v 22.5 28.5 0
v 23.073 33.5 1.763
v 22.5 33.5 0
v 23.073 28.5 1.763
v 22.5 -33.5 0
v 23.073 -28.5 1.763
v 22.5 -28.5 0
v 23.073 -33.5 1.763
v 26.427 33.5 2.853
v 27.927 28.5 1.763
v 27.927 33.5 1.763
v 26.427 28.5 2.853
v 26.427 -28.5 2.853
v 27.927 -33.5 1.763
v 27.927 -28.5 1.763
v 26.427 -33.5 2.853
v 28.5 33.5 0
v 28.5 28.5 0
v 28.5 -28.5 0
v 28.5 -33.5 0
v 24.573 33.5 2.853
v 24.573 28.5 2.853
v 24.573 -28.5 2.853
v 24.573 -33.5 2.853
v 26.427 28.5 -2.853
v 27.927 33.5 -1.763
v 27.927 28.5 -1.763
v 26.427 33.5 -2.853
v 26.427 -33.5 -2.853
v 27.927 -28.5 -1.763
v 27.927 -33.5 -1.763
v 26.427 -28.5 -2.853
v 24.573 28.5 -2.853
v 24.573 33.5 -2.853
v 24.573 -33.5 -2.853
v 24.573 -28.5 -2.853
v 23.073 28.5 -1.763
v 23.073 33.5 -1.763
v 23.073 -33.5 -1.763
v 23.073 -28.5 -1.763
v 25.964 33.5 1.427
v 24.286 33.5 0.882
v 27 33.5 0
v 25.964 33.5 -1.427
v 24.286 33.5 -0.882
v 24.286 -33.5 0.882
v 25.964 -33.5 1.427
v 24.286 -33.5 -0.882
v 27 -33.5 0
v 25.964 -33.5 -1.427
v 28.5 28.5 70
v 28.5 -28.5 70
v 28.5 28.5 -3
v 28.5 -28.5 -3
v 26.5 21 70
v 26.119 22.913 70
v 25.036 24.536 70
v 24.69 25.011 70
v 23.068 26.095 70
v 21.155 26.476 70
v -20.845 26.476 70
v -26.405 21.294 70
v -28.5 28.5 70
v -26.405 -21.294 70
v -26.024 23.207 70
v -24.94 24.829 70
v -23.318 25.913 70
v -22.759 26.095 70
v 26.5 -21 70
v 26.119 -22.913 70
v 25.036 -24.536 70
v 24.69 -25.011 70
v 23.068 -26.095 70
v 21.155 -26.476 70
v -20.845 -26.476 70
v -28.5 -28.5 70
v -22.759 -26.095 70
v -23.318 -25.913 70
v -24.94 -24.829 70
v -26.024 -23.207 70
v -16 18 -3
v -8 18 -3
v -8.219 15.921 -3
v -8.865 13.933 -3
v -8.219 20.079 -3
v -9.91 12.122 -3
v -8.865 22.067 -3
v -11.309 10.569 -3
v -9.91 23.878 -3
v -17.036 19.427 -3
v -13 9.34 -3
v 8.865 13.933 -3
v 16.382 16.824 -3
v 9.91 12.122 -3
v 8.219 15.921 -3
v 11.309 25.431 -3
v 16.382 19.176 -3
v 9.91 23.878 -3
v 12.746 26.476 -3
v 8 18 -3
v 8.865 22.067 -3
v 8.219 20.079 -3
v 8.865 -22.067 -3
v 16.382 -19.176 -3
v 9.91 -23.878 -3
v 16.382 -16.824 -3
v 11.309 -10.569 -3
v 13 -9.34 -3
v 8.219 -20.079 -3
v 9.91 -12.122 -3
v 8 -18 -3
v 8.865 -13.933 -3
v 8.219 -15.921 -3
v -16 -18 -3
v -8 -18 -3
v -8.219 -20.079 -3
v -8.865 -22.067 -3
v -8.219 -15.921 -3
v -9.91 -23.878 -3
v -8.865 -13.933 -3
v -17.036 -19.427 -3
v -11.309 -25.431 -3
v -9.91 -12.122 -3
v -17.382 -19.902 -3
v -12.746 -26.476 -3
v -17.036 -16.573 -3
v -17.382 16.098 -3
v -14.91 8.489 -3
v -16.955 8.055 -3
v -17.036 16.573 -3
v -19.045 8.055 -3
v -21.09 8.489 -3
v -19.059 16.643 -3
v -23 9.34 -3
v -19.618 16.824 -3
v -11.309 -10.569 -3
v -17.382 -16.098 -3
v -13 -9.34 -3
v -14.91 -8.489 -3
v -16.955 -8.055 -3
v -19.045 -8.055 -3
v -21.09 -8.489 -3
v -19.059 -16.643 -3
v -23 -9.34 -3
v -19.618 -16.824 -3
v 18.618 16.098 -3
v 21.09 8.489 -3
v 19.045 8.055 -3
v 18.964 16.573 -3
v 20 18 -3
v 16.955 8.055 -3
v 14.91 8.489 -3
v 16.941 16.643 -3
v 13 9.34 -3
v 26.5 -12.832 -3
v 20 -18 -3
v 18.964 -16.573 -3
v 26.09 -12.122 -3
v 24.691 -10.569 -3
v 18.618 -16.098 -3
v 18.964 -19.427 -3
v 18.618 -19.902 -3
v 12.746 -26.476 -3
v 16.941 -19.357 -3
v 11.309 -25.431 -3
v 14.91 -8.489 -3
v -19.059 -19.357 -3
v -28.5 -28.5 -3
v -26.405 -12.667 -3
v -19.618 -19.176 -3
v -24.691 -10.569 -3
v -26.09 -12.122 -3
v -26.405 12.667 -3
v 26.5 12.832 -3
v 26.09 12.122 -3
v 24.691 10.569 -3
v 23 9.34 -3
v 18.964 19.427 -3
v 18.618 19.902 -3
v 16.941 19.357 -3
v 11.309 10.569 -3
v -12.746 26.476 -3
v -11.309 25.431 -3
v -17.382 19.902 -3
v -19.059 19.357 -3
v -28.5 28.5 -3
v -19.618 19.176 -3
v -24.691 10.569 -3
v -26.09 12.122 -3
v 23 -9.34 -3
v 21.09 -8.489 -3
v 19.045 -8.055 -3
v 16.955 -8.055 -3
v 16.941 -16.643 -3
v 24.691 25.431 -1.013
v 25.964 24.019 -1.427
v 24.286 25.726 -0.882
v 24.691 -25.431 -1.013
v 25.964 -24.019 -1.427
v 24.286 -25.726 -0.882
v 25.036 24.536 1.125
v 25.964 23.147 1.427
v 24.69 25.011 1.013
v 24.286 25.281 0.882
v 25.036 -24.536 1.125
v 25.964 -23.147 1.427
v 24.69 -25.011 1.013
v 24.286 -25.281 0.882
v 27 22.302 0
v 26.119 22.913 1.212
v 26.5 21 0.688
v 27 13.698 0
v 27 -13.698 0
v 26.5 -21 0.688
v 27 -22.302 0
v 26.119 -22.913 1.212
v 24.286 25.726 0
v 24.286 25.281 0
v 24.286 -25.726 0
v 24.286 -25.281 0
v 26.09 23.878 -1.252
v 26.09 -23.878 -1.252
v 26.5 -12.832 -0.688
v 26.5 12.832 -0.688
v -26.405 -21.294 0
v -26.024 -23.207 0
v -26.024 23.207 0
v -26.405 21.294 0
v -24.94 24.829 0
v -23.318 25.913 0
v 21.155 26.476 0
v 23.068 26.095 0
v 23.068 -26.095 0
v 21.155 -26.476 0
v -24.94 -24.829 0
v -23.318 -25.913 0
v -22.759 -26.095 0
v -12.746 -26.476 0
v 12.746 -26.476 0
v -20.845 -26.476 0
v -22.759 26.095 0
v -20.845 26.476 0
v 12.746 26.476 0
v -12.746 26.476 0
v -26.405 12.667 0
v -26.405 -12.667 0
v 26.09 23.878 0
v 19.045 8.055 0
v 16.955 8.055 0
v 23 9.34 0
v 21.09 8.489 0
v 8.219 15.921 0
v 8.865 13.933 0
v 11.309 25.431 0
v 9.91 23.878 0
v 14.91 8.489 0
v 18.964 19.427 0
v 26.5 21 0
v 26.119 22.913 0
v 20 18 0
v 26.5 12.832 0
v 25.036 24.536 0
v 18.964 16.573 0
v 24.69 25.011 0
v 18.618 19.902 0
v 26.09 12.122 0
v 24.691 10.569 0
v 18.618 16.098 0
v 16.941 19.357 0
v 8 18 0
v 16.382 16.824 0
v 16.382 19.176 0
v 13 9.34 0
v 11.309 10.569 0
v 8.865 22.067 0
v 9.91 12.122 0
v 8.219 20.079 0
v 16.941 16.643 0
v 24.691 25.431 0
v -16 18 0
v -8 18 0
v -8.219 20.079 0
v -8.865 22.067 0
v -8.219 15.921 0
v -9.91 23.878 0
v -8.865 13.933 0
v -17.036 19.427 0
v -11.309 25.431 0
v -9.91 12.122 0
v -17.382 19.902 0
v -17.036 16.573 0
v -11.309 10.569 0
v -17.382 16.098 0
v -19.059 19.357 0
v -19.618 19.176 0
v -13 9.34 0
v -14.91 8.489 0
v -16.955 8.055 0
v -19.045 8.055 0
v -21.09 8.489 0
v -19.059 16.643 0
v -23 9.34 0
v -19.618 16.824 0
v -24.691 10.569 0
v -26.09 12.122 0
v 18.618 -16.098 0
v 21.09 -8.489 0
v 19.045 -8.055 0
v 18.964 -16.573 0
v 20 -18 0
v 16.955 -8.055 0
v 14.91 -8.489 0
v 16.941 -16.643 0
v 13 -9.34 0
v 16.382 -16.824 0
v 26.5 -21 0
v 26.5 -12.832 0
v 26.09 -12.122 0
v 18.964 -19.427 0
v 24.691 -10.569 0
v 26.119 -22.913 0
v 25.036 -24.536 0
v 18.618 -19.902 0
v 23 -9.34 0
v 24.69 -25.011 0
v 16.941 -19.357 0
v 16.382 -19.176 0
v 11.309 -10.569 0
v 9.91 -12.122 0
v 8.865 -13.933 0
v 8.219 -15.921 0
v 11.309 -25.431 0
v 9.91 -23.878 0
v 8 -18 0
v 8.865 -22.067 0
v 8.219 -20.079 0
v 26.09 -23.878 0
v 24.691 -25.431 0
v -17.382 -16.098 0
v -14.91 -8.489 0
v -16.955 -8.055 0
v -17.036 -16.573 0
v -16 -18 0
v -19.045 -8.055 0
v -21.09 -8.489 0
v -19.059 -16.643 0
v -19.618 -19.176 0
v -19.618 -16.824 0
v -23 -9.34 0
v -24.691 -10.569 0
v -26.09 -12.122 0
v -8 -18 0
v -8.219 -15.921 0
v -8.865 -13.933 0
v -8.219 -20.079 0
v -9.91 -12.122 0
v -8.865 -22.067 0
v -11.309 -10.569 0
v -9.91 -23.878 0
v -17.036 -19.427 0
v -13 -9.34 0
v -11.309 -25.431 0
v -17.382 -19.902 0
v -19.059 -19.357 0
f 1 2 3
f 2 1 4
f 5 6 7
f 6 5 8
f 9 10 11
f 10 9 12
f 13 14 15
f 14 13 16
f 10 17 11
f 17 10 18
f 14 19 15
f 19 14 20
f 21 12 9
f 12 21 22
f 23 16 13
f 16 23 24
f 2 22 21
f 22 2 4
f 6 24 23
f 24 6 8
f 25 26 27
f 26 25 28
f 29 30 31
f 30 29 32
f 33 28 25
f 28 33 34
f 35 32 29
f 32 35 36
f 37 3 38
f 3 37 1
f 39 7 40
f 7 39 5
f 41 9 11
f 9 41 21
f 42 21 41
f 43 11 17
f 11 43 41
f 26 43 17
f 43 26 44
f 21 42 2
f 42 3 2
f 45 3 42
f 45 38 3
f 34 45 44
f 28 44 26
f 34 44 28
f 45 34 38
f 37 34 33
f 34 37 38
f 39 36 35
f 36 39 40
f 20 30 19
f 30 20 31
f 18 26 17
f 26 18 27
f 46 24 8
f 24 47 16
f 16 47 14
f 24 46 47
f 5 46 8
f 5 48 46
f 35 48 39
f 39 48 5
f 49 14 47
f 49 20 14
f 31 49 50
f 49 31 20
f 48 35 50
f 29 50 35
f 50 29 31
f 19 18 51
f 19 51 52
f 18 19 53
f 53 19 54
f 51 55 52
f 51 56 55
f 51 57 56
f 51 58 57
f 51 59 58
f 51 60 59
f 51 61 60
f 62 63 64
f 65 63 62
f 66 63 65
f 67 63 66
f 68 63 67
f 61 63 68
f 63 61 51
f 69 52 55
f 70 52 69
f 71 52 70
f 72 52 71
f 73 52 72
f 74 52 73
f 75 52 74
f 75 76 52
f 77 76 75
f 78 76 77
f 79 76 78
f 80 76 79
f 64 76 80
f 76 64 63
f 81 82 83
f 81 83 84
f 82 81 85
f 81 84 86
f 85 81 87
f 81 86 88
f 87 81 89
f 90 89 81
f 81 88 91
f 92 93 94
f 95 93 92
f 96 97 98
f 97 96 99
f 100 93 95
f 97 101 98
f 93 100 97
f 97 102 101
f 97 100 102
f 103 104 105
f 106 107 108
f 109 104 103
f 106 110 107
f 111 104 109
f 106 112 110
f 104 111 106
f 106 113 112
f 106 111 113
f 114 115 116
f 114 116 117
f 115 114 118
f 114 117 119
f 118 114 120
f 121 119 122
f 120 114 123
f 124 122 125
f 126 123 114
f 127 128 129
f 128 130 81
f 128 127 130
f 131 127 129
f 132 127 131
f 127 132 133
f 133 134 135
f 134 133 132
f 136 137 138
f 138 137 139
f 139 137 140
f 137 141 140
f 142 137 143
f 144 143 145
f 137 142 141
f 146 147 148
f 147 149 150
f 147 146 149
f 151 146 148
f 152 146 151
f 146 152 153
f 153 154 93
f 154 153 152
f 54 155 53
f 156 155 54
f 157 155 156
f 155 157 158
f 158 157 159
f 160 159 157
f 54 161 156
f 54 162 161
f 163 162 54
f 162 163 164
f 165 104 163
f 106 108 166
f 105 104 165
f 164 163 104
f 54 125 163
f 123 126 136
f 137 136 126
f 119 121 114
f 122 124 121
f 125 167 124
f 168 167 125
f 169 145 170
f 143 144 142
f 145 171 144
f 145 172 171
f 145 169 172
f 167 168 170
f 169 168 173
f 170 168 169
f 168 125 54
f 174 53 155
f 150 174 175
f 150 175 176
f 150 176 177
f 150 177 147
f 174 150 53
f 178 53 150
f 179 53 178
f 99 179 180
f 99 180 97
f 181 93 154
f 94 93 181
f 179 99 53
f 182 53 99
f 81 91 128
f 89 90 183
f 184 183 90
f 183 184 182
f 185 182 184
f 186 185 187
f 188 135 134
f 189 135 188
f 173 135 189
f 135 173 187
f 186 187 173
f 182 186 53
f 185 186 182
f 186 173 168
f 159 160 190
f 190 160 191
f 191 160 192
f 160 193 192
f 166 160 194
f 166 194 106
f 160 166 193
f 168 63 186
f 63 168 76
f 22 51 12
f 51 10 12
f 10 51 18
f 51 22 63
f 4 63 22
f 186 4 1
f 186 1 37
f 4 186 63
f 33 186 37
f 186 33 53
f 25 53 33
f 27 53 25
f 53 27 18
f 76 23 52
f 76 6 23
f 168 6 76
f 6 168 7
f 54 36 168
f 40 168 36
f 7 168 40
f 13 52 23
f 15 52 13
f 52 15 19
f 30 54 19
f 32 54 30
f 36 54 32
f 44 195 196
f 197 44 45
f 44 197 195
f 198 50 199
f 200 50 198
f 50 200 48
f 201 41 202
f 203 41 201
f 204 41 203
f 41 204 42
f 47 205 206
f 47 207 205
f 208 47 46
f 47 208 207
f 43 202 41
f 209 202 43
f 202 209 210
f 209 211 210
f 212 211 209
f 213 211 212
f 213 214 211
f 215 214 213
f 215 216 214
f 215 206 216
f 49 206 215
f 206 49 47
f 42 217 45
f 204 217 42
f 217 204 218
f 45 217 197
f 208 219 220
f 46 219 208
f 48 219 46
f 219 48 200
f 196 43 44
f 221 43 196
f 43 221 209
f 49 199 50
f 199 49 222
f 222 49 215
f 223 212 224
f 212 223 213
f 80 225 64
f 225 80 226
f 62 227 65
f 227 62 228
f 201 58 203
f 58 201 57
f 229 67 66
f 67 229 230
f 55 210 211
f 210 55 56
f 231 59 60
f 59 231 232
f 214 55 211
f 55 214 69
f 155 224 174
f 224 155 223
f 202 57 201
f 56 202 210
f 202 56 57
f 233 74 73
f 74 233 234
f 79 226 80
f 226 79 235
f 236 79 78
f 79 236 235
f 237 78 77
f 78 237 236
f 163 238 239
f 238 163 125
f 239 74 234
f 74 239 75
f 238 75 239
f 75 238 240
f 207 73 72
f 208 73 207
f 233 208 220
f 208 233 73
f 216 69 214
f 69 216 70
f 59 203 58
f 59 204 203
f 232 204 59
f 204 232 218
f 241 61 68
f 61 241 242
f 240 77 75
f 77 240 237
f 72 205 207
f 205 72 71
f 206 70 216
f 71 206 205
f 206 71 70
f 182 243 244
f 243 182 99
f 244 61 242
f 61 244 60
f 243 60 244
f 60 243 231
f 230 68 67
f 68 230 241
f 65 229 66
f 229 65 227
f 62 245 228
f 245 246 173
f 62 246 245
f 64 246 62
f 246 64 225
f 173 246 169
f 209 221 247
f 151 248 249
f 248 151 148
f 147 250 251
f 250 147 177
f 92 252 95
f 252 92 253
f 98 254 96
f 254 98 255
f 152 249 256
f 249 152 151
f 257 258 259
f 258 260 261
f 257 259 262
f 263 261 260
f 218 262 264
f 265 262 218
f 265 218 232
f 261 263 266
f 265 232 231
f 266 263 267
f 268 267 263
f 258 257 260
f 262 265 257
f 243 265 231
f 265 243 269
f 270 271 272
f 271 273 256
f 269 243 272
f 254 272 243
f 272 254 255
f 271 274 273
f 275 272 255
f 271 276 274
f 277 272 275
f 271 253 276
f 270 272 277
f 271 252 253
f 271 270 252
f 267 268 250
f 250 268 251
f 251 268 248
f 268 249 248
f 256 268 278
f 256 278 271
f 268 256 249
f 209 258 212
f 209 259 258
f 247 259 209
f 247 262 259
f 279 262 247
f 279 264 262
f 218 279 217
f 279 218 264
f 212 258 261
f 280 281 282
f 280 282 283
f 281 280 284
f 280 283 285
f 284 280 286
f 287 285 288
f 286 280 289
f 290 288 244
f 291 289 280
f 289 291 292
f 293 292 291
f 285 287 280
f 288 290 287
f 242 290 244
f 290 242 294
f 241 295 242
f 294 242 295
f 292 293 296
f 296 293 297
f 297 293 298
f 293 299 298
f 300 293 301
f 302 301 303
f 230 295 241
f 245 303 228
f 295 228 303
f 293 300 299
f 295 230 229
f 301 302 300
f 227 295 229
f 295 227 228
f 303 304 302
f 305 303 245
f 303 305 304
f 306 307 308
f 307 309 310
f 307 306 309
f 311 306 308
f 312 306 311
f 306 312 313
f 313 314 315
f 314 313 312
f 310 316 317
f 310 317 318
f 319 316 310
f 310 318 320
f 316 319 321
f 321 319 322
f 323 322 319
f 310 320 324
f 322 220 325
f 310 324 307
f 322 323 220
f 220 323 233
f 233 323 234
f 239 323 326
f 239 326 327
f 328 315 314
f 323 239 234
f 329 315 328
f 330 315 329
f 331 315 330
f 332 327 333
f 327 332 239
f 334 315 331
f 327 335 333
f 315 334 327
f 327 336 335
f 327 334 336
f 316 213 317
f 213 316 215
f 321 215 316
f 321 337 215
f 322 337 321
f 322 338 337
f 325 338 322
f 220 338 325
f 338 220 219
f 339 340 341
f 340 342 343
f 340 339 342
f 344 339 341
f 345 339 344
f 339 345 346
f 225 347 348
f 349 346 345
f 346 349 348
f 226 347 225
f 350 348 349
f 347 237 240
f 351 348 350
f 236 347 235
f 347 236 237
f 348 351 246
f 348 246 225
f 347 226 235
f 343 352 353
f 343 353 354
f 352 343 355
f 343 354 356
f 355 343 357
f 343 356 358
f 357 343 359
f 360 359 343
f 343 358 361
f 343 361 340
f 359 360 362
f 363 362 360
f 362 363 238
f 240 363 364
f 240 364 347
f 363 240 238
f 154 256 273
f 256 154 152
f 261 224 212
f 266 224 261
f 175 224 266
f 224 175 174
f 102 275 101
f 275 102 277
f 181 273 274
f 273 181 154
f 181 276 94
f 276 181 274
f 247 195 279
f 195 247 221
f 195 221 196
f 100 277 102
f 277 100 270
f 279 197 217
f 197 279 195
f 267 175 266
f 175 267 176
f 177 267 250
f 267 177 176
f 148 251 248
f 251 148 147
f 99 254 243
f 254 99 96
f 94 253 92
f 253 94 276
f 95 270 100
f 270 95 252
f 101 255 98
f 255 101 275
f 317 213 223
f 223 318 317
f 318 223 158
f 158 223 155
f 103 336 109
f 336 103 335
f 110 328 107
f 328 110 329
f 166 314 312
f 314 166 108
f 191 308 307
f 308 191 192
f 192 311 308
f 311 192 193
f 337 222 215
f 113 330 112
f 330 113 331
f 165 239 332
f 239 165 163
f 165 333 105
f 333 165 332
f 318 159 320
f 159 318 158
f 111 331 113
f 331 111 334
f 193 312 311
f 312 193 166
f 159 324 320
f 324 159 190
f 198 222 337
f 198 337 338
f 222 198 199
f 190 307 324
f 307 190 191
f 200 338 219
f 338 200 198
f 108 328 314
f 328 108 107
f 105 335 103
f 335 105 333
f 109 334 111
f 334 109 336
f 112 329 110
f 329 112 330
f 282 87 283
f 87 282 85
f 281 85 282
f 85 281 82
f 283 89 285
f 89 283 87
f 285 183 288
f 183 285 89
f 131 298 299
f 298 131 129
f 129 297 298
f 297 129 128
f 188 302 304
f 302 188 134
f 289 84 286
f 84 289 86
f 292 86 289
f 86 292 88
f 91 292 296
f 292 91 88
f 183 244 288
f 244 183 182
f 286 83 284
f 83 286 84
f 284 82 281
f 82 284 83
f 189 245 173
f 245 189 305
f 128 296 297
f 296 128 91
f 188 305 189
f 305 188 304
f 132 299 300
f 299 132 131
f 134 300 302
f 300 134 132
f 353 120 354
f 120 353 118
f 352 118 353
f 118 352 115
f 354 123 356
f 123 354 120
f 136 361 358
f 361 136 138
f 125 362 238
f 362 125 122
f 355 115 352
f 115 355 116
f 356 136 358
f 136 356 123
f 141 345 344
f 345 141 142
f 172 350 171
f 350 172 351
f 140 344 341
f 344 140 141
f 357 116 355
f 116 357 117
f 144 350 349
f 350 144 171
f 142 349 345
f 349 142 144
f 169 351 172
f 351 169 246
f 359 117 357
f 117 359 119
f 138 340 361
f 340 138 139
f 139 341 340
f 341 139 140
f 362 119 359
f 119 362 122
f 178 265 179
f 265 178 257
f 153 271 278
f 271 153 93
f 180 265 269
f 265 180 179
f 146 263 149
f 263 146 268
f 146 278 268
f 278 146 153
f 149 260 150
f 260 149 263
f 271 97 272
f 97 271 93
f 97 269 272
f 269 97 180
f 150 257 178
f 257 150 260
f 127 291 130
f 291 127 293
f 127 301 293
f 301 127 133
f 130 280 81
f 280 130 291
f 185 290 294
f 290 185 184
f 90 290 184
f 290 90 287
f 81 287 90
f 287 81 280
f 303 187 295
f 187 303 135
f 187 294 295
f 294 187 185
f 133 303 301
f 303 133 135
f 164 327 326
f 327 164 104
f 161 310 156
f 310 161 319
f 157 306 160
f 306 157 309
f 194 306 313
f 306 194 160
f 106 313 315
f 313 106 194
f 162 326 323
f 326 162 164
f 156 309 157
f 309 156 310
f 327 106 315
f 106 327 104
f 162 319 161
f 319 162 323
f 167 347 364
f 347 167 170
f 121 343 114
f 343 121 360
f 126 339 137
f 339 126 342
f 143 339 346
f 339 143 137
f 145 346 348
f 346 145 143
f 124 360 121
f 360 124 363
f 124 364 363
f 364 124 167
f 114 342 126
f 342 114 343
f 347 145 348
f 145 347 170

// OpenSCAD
module cCube(v){
    translate(-0.5*[v[0], v[1], 0]) cube(v);
}

module contour(){
    cylinder(75, 5,5);
    translate([0,0,75]) sphere(5);
}

module quad(dx, dy){
    hdx=dx/2;
    hdy = dy/2;
    translate([hdx, hdy, 0]) children();
    translate([hdx, -hdy, 0]) children();
    translate([-hdx, hdy, 0]) children();
    translate([-hdx, -hdy, 0]) children();
}

module oscillatorBody() {
    hull() quad(52-10, 52-10)contour();
}

module oscillatorHolePattern(r=3/2, l=13){
    translate([0,0,-13]) quad(36, 36) cylinder(l,r, r);
}

module oscillator(){
    oscillatorBody();
    oscillatorHolePattern();
}

module screwTowers(r,l){
    translate([57/2-3,0,0])rotate([90,0,0])translate([0,0,-l/2])cylinder(l,r,r);
}

module sleeveBody(){
    difference(){
    union(){
        screwTowers(3, 57+10);
        translate([0,0,-3]) cCube([57,57,73]);
    }
    screwTowers(3/2, 57+10+1);
}
    
}



module sleeveTube(){
difference(){
    sleeveBody();
    minkowski(){    
        oscillator();
        translate([0,0,-5]) cylinder(10, 0.5,0.5);
    }
}
}
module sleeve(){
    sleeveTube();
    difference(){
    translate([0,0,10]) oscillatorHolePattern(10,3);
        minkowski(){    
            oscillator();
            translate([0,0,0]) cylinder(0.1, 0.5,0.5);
        }
    }
}


module assembly(){
//oscillator();
sleeve();
}



assembly();
